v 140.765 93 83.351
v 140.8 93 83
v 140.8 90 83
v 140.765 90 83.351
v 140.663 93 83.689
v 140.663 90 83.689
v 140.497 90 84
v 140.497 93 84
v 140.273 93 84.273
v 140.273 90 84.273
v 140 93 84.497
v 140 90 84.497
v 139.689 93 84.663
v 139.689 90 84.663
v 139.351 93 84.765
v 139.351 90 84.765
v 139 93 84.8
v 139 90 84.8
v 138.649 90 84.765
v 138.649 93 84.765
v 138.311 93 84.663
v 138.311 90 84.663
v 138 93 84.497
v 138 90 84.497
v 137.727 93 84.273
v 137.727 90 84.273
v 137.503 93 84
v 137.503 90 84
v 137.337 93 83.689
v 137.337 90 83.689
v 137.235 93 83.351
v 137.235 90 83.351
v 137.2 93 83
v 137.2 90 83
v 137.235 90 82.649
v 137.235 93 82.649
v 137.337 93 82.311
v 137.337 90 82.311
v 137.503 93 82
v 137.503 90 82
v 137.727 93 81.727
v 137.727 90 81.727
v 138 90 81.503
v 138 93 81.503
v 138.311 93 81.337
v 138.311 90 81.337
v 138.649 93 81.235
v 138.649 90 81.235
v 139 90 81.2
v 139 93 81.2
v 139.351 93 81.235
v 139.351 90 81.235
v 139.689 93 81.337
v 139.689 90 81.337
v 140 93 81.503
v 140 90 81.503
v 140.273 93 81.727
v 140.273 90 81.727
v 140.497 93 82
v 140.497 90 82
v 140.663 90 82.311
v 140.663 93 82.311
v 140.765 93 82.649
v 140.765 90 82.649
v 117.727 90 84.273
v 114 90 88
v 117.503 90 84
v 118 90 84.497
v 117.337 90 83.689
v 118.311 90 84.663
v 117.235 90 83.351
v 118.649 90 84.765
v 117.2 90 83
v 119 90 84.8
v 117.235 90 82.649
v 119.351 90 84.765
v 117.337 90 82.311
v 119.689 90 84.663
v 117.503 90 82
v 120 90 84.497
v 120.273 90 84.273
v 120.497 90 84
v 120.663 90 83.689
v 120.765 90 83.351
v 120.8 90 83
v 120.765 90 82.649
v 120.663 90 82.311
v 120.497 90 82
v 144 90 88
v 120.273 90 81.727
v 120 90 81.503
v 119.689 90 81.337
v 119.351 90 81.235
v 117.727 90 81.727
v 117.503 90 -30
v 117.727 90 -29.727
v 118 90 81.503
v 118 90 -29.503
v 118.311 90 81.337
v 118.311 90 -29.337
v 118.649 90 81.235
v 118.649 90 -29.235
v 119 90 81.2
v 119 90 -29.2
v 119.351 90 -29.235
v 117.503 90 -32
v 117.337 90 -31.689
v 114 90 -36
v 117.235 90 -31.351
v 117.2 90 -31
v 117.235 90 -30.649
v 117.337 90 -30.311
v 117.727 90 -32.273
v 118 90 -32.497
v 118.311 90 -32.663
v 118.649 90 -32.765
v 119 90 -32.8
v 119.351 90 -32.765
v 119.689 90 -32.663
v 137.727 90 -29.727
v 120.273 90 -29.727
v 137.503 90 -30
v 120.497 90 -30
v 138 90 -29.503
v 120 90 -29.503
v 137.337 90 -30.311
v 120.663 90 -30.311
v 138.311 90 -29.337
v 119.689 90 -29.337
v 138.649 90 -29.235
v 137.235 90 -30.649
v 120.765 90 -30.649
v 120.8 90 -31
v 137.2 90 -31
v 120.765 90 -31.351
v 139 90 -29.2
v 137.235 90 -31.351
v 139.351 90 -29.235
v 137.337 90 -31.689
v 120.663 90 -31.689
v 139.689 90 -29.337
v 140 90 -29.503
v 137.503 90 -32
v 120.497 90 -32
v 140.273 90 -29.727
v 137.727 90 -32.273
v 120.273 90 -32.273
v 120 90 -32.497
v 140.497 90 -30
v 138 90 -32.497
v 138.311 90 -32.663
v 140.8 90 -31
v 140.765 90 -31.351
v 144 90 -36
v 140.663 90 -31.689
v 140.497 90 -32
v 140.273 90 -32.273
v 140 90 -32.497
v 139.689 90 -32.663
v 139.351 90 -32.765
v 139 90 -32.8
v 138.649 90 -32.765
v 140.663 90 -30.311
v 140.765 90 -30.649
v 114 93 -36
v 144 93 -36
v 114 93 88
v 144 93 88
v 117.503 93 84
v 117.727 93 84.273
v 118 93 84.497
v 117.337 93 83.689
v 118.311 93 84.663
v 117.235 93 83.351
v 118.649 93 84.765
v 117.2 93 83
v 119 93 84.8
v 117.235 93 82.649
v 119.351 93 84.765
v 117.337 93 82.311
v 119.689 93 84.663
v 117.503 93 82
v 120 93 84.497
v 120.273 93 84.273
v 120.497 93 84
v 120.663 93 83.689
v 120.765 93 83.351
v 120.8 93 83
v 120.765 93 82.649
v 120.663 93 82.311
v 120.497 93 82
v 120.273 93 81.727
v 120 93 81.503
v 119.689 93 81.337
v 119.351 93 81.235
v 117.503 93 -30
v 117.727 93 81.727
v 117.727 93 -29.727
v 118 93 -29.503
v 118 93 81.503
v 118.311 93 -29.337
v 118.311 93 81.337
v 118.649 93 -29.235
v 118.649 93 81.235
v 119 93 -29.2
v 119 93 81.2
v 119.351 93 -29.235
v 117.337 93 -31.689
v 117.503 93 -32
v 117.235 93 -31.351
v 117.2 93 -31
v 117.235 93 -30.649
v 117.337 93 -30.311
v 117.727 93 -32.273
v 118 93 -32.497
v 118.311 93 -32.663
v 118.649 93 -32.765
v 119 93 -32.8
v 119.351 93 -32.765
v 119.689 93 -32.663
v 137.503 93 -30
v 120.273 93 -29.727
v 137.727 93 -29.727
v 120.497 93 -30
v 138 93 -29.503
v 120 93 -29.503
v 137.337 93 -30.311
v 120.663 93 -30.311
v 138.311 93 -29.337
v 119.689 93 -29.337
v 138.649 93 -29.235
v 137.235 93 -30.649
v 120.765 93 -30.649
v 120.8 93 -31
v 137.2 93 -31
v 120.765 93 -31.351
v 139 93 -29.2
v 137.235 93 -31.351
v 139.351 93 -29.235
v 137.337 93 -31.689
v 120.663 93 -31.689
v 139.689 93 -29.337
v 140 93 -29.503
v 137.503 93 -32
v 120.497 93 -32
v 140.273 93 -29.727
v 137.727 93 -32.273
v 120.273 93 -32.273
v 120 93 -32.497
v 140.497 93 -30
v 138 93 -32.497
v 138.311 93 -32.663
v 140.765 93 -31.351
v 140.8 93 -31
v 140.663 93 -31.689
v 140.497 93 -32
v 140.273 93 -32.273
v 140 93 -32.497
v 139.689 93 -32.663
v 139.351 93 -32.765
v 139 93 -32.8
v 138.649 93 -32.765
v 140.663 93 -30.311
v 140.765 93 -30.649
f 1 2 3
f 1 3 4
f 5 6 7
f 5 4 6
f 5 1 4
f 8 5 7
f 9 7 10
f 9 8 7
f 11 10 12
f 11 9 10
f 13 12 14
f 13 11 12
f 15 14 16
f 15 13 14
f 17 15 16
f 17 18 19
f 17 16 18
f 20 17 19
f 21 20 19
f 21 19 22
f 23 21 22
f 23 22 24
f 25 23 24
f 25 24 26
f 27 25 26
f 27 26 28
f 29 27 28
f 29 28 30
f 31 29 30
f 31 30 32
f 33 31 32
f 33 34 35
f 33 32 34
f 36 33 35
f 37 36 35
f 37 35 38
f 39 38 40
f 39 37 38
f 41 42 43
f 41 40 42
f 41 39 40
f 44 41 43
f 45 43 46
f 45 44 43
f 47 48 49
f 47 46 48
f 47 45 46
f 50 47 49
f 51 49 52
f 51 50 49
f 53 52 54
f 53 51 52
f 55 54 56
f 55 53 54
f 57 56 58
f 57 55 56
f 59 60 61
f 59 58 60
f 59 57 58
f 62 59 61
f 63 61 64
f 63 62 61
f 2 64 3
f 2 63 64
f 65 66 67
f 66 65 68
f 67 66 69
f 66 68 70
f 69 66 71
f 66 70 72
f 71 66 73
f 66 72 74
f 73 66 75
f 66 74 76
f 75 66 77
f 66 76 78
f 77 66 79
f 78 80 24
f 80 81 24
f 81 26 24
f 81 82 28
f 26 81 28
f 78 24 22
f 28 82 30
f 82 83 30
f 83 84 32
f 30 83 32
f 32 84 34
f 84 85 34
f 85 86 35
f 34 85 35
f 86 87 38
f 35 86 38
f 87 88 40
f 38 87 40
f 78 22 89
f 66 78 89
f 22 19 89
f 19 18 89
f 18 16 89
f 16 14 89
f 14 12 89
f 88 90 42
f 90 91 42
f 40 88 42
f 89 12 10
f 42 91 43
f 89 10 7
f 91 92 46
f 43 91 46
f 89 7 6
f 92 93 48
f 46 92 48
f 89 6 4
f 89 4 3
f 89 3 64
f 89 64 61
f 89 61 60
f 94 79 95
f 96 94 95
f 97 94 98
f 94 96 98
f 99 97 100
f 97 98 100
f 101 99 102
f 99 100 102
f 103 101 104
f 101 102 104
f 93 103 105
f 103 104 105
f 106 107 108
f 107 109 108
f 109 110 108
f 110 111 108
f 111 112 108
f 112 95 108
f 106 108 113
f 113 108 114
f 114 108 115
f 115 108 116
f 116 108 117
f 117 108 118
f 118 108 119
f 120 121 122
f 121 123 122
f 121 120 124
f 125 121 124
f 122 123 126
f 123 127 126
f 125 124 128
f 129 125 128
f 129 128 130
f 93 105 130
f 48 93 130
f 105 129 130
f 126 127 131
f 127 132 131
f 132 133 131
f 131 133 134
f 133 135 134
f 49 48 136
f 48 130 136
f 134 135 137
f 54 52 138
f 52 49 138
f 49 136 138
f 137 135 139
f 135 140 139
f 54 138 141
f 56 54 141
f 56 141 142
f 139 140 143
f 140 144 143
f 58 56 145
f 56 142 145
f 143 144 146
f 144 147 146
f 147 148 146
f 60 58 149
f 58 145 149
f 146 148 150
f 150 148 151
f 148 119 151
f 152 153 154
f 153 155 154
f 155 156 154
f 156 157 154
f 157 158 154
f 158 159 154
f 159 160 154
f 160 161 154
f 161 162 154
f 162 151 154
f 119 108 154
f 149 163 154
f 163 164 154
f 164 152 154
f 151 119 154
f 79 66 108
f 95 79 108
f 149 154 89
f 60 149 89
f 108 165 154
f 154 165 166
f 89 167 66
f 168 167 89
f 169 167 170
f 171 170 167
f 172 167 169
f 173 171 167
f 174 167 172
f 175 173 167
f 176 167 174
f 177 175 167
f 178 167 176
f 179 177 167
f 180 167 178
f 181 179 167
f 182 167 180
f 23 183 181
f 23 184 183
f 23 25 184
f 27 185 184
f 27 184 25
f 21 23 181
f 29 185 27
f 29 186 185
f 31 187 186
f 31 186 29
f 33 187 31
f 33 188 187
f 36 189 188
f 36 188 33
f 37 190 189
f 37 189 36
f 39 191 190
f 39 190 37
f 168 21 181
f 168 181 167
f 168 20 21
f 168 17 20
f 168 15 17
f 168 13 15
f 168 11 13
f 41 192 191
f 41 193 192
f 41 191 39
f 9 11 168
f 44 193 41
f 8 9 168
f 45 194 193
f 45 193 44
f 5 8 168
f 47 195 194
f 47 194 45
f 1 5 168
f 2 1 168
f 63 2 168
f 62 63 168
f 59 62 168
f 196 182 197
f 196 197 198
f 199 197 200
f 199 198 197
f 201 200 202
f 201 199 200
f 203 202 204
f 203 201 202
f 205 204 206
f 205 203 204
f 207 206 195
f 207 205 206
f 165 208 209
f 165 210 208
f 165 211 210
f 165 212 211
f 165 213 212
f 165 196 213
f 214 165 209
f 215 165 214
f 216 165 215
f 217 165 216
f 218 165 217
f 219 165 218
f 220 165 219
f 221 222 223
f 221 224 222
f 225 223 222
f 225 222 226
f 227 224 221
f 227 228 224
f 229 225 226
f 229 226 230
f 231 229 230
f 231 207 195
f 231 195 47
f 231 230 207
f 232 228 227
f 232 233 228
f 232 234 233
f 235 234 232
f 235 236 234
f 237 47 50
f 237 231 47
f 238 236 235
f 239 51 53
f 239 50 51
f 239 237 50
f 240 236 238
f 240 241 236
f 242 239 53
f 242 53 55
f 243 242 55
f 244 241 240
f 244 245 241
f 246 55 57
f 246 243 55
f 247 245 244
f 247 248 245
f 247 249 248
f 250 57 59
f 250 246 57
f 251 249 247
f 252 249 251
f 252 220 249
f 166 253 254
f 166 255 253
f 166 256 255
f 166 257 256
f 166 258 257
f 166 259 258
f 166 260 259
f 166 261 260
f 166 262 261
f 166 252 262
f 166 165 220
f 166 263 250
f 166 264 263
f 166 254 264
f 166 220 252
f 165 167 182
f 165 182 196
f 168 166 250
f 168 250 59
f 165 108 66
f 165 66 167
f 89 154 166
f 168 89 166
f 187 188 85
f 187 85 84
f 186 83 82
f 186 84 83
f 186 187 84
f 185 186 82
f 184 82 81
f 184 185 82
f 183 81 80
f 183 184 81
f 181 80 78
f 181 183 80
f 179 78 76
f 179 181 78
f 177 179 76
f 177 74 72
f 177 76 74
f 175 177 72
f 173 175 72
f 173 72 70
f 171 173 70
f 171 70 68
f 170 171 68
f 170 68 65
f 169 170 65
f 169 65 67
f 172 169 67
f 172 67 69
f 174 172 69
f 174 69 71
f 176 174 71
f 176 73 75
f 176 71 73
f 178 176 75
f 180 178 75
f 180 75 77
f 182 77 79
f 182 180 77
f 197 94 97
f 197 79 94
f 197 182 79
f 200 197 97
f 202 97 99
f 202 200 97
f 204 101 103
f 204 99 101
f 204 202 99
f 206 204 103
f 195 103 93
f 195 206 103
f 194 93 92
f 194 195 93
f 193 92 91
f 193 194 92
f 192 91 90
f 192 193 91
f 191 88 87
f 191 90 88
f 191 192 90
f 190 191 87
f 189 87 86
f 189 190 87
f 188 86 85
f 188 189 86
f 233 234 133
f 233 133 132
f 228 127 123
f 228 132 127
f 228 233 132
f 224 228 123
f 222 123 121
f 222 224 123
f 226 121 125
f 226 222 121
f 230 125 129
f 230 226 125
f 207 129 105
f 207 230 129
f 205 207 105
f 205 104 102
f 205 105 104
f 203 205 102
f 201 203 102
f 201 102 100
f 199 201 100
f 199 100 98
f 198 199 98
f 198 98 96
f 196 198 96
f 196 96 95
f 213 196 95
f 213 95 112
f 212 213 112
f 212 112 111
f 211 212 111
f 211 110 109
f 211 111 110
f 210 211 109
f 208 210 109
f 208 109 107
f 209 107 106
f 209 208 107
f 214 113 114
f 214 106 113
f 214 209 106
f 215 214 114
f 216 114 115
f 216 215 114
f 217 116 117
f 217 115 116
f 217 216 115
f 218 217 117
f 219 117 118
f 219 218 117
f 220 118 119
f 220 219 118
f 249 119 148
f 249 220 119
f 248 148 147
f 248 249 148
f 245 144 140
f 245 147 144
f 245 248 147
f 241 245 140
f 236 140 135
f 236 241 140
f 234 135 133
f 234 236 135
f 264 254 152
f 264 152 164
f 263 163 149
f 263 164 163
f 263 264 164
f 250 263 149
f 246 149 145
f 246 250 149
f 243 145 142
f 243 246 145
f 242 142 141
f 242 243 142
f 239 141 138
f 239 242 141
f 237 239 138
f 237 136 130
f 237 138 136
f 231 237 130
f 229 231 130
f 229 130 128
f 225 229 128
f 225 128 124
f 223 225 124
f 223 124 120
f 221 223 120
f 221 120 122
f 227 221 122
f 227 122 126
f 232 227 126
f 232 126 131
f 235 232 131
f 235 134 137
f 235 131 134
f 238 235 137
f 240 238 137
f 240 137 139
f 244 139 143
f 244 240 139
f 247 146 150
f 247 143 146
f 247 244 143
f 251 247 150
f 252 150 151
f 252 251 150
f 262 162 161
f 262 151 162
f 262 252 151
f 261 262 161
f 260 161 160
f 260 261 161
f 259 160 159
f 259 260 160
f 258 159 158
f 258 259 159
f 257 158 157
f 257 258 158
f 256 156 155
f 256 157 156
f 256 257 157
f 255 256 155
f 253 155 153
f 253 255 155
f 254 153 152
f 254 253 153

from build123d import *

# Parameters (mm, degrees)
CYLINDER038_R       = 1.8
CYLINDER038_DEPTH   = 10
ARRAY001019_X_COUNT = 2
ARRAY001019_X_PITCH = 20
ARRAY001019_Z_COUNT = 2
ARRAY001019_Z_PITCH = 114
BOX018_W            = 30
BOX018_H            = 3
BOX018_DEPTH        = 124


with BuildPart() as side_connector_hole_array:
    # Cylinder038 → Cylinder038 (new body)
    with BuildSketch(Plane.XZ):
        Circle(CYLINDER038_R)
    extrude(amount=CYLINDER038_DEPTH)

    # Array001019 X: side connector hole array ×2


with BuildPart() as side_connector_hole_array_1:
    add(side_connector_hole_array.part)
    with Locations(*[(i * ARRAY001019_X_PITCH, 0, 0) for i in range(1, ARRAY001019_X_COUNT)]):
        add(side_connector_hole_array.part)

    # Array001019 Z: side connector hole array ×2


with BuildPart() as side_connector_hole_array_2:
    add(side_connector_hole_array_1.part)
    with Locations(*[(0, 0, i * ARRAY001019_Z_PITCH) for i in range(1, ARRAY001019_Z_COUNT)]):
        add(side_connector_hole_array_1.part)


with BuildPart() as side_connector_hole_array_3:
    # Array001019 placement: moved
    add(side_connector_hole_array_2.part.moved(Location((5, 5, 5))))


with BuildPart() as vertical_side_connector_clone002:
    # Box018 → Box018 (new body)
    with BuildSketch(Plane.XY):
        with Locations((15, 1.5)):
            Rectangle(BOX018_W, BOX018_H)
    extrude(amount=BOX018_DEPTH)

    # Cut014: cut side connector hole array
    add(side_connector_hole_array_3.part, mode=Mode.SUBTRACT)


with BuildPart() as vertical_side_connector_clone002_1:
    # Compound001 placement: moved
    add(vertical_side_connector_clone002.part.moved(Location((0, -11, -36))))


with BuildPart() as vertical_side_connector_clone002_2:
    # Clone006 placement: moved
    add(vertical_side_connector_clone002_1.part.moved(Location((0, 6, 2))))


with BuildPart() as vertical_side_connector_clone002_3:
    # Body006 placement: moved
    add(vertical_side_connector_clone002_2.part.moved(Location((114, 95, -2))))


solid = vertical_side_connector_clone002_3.part
